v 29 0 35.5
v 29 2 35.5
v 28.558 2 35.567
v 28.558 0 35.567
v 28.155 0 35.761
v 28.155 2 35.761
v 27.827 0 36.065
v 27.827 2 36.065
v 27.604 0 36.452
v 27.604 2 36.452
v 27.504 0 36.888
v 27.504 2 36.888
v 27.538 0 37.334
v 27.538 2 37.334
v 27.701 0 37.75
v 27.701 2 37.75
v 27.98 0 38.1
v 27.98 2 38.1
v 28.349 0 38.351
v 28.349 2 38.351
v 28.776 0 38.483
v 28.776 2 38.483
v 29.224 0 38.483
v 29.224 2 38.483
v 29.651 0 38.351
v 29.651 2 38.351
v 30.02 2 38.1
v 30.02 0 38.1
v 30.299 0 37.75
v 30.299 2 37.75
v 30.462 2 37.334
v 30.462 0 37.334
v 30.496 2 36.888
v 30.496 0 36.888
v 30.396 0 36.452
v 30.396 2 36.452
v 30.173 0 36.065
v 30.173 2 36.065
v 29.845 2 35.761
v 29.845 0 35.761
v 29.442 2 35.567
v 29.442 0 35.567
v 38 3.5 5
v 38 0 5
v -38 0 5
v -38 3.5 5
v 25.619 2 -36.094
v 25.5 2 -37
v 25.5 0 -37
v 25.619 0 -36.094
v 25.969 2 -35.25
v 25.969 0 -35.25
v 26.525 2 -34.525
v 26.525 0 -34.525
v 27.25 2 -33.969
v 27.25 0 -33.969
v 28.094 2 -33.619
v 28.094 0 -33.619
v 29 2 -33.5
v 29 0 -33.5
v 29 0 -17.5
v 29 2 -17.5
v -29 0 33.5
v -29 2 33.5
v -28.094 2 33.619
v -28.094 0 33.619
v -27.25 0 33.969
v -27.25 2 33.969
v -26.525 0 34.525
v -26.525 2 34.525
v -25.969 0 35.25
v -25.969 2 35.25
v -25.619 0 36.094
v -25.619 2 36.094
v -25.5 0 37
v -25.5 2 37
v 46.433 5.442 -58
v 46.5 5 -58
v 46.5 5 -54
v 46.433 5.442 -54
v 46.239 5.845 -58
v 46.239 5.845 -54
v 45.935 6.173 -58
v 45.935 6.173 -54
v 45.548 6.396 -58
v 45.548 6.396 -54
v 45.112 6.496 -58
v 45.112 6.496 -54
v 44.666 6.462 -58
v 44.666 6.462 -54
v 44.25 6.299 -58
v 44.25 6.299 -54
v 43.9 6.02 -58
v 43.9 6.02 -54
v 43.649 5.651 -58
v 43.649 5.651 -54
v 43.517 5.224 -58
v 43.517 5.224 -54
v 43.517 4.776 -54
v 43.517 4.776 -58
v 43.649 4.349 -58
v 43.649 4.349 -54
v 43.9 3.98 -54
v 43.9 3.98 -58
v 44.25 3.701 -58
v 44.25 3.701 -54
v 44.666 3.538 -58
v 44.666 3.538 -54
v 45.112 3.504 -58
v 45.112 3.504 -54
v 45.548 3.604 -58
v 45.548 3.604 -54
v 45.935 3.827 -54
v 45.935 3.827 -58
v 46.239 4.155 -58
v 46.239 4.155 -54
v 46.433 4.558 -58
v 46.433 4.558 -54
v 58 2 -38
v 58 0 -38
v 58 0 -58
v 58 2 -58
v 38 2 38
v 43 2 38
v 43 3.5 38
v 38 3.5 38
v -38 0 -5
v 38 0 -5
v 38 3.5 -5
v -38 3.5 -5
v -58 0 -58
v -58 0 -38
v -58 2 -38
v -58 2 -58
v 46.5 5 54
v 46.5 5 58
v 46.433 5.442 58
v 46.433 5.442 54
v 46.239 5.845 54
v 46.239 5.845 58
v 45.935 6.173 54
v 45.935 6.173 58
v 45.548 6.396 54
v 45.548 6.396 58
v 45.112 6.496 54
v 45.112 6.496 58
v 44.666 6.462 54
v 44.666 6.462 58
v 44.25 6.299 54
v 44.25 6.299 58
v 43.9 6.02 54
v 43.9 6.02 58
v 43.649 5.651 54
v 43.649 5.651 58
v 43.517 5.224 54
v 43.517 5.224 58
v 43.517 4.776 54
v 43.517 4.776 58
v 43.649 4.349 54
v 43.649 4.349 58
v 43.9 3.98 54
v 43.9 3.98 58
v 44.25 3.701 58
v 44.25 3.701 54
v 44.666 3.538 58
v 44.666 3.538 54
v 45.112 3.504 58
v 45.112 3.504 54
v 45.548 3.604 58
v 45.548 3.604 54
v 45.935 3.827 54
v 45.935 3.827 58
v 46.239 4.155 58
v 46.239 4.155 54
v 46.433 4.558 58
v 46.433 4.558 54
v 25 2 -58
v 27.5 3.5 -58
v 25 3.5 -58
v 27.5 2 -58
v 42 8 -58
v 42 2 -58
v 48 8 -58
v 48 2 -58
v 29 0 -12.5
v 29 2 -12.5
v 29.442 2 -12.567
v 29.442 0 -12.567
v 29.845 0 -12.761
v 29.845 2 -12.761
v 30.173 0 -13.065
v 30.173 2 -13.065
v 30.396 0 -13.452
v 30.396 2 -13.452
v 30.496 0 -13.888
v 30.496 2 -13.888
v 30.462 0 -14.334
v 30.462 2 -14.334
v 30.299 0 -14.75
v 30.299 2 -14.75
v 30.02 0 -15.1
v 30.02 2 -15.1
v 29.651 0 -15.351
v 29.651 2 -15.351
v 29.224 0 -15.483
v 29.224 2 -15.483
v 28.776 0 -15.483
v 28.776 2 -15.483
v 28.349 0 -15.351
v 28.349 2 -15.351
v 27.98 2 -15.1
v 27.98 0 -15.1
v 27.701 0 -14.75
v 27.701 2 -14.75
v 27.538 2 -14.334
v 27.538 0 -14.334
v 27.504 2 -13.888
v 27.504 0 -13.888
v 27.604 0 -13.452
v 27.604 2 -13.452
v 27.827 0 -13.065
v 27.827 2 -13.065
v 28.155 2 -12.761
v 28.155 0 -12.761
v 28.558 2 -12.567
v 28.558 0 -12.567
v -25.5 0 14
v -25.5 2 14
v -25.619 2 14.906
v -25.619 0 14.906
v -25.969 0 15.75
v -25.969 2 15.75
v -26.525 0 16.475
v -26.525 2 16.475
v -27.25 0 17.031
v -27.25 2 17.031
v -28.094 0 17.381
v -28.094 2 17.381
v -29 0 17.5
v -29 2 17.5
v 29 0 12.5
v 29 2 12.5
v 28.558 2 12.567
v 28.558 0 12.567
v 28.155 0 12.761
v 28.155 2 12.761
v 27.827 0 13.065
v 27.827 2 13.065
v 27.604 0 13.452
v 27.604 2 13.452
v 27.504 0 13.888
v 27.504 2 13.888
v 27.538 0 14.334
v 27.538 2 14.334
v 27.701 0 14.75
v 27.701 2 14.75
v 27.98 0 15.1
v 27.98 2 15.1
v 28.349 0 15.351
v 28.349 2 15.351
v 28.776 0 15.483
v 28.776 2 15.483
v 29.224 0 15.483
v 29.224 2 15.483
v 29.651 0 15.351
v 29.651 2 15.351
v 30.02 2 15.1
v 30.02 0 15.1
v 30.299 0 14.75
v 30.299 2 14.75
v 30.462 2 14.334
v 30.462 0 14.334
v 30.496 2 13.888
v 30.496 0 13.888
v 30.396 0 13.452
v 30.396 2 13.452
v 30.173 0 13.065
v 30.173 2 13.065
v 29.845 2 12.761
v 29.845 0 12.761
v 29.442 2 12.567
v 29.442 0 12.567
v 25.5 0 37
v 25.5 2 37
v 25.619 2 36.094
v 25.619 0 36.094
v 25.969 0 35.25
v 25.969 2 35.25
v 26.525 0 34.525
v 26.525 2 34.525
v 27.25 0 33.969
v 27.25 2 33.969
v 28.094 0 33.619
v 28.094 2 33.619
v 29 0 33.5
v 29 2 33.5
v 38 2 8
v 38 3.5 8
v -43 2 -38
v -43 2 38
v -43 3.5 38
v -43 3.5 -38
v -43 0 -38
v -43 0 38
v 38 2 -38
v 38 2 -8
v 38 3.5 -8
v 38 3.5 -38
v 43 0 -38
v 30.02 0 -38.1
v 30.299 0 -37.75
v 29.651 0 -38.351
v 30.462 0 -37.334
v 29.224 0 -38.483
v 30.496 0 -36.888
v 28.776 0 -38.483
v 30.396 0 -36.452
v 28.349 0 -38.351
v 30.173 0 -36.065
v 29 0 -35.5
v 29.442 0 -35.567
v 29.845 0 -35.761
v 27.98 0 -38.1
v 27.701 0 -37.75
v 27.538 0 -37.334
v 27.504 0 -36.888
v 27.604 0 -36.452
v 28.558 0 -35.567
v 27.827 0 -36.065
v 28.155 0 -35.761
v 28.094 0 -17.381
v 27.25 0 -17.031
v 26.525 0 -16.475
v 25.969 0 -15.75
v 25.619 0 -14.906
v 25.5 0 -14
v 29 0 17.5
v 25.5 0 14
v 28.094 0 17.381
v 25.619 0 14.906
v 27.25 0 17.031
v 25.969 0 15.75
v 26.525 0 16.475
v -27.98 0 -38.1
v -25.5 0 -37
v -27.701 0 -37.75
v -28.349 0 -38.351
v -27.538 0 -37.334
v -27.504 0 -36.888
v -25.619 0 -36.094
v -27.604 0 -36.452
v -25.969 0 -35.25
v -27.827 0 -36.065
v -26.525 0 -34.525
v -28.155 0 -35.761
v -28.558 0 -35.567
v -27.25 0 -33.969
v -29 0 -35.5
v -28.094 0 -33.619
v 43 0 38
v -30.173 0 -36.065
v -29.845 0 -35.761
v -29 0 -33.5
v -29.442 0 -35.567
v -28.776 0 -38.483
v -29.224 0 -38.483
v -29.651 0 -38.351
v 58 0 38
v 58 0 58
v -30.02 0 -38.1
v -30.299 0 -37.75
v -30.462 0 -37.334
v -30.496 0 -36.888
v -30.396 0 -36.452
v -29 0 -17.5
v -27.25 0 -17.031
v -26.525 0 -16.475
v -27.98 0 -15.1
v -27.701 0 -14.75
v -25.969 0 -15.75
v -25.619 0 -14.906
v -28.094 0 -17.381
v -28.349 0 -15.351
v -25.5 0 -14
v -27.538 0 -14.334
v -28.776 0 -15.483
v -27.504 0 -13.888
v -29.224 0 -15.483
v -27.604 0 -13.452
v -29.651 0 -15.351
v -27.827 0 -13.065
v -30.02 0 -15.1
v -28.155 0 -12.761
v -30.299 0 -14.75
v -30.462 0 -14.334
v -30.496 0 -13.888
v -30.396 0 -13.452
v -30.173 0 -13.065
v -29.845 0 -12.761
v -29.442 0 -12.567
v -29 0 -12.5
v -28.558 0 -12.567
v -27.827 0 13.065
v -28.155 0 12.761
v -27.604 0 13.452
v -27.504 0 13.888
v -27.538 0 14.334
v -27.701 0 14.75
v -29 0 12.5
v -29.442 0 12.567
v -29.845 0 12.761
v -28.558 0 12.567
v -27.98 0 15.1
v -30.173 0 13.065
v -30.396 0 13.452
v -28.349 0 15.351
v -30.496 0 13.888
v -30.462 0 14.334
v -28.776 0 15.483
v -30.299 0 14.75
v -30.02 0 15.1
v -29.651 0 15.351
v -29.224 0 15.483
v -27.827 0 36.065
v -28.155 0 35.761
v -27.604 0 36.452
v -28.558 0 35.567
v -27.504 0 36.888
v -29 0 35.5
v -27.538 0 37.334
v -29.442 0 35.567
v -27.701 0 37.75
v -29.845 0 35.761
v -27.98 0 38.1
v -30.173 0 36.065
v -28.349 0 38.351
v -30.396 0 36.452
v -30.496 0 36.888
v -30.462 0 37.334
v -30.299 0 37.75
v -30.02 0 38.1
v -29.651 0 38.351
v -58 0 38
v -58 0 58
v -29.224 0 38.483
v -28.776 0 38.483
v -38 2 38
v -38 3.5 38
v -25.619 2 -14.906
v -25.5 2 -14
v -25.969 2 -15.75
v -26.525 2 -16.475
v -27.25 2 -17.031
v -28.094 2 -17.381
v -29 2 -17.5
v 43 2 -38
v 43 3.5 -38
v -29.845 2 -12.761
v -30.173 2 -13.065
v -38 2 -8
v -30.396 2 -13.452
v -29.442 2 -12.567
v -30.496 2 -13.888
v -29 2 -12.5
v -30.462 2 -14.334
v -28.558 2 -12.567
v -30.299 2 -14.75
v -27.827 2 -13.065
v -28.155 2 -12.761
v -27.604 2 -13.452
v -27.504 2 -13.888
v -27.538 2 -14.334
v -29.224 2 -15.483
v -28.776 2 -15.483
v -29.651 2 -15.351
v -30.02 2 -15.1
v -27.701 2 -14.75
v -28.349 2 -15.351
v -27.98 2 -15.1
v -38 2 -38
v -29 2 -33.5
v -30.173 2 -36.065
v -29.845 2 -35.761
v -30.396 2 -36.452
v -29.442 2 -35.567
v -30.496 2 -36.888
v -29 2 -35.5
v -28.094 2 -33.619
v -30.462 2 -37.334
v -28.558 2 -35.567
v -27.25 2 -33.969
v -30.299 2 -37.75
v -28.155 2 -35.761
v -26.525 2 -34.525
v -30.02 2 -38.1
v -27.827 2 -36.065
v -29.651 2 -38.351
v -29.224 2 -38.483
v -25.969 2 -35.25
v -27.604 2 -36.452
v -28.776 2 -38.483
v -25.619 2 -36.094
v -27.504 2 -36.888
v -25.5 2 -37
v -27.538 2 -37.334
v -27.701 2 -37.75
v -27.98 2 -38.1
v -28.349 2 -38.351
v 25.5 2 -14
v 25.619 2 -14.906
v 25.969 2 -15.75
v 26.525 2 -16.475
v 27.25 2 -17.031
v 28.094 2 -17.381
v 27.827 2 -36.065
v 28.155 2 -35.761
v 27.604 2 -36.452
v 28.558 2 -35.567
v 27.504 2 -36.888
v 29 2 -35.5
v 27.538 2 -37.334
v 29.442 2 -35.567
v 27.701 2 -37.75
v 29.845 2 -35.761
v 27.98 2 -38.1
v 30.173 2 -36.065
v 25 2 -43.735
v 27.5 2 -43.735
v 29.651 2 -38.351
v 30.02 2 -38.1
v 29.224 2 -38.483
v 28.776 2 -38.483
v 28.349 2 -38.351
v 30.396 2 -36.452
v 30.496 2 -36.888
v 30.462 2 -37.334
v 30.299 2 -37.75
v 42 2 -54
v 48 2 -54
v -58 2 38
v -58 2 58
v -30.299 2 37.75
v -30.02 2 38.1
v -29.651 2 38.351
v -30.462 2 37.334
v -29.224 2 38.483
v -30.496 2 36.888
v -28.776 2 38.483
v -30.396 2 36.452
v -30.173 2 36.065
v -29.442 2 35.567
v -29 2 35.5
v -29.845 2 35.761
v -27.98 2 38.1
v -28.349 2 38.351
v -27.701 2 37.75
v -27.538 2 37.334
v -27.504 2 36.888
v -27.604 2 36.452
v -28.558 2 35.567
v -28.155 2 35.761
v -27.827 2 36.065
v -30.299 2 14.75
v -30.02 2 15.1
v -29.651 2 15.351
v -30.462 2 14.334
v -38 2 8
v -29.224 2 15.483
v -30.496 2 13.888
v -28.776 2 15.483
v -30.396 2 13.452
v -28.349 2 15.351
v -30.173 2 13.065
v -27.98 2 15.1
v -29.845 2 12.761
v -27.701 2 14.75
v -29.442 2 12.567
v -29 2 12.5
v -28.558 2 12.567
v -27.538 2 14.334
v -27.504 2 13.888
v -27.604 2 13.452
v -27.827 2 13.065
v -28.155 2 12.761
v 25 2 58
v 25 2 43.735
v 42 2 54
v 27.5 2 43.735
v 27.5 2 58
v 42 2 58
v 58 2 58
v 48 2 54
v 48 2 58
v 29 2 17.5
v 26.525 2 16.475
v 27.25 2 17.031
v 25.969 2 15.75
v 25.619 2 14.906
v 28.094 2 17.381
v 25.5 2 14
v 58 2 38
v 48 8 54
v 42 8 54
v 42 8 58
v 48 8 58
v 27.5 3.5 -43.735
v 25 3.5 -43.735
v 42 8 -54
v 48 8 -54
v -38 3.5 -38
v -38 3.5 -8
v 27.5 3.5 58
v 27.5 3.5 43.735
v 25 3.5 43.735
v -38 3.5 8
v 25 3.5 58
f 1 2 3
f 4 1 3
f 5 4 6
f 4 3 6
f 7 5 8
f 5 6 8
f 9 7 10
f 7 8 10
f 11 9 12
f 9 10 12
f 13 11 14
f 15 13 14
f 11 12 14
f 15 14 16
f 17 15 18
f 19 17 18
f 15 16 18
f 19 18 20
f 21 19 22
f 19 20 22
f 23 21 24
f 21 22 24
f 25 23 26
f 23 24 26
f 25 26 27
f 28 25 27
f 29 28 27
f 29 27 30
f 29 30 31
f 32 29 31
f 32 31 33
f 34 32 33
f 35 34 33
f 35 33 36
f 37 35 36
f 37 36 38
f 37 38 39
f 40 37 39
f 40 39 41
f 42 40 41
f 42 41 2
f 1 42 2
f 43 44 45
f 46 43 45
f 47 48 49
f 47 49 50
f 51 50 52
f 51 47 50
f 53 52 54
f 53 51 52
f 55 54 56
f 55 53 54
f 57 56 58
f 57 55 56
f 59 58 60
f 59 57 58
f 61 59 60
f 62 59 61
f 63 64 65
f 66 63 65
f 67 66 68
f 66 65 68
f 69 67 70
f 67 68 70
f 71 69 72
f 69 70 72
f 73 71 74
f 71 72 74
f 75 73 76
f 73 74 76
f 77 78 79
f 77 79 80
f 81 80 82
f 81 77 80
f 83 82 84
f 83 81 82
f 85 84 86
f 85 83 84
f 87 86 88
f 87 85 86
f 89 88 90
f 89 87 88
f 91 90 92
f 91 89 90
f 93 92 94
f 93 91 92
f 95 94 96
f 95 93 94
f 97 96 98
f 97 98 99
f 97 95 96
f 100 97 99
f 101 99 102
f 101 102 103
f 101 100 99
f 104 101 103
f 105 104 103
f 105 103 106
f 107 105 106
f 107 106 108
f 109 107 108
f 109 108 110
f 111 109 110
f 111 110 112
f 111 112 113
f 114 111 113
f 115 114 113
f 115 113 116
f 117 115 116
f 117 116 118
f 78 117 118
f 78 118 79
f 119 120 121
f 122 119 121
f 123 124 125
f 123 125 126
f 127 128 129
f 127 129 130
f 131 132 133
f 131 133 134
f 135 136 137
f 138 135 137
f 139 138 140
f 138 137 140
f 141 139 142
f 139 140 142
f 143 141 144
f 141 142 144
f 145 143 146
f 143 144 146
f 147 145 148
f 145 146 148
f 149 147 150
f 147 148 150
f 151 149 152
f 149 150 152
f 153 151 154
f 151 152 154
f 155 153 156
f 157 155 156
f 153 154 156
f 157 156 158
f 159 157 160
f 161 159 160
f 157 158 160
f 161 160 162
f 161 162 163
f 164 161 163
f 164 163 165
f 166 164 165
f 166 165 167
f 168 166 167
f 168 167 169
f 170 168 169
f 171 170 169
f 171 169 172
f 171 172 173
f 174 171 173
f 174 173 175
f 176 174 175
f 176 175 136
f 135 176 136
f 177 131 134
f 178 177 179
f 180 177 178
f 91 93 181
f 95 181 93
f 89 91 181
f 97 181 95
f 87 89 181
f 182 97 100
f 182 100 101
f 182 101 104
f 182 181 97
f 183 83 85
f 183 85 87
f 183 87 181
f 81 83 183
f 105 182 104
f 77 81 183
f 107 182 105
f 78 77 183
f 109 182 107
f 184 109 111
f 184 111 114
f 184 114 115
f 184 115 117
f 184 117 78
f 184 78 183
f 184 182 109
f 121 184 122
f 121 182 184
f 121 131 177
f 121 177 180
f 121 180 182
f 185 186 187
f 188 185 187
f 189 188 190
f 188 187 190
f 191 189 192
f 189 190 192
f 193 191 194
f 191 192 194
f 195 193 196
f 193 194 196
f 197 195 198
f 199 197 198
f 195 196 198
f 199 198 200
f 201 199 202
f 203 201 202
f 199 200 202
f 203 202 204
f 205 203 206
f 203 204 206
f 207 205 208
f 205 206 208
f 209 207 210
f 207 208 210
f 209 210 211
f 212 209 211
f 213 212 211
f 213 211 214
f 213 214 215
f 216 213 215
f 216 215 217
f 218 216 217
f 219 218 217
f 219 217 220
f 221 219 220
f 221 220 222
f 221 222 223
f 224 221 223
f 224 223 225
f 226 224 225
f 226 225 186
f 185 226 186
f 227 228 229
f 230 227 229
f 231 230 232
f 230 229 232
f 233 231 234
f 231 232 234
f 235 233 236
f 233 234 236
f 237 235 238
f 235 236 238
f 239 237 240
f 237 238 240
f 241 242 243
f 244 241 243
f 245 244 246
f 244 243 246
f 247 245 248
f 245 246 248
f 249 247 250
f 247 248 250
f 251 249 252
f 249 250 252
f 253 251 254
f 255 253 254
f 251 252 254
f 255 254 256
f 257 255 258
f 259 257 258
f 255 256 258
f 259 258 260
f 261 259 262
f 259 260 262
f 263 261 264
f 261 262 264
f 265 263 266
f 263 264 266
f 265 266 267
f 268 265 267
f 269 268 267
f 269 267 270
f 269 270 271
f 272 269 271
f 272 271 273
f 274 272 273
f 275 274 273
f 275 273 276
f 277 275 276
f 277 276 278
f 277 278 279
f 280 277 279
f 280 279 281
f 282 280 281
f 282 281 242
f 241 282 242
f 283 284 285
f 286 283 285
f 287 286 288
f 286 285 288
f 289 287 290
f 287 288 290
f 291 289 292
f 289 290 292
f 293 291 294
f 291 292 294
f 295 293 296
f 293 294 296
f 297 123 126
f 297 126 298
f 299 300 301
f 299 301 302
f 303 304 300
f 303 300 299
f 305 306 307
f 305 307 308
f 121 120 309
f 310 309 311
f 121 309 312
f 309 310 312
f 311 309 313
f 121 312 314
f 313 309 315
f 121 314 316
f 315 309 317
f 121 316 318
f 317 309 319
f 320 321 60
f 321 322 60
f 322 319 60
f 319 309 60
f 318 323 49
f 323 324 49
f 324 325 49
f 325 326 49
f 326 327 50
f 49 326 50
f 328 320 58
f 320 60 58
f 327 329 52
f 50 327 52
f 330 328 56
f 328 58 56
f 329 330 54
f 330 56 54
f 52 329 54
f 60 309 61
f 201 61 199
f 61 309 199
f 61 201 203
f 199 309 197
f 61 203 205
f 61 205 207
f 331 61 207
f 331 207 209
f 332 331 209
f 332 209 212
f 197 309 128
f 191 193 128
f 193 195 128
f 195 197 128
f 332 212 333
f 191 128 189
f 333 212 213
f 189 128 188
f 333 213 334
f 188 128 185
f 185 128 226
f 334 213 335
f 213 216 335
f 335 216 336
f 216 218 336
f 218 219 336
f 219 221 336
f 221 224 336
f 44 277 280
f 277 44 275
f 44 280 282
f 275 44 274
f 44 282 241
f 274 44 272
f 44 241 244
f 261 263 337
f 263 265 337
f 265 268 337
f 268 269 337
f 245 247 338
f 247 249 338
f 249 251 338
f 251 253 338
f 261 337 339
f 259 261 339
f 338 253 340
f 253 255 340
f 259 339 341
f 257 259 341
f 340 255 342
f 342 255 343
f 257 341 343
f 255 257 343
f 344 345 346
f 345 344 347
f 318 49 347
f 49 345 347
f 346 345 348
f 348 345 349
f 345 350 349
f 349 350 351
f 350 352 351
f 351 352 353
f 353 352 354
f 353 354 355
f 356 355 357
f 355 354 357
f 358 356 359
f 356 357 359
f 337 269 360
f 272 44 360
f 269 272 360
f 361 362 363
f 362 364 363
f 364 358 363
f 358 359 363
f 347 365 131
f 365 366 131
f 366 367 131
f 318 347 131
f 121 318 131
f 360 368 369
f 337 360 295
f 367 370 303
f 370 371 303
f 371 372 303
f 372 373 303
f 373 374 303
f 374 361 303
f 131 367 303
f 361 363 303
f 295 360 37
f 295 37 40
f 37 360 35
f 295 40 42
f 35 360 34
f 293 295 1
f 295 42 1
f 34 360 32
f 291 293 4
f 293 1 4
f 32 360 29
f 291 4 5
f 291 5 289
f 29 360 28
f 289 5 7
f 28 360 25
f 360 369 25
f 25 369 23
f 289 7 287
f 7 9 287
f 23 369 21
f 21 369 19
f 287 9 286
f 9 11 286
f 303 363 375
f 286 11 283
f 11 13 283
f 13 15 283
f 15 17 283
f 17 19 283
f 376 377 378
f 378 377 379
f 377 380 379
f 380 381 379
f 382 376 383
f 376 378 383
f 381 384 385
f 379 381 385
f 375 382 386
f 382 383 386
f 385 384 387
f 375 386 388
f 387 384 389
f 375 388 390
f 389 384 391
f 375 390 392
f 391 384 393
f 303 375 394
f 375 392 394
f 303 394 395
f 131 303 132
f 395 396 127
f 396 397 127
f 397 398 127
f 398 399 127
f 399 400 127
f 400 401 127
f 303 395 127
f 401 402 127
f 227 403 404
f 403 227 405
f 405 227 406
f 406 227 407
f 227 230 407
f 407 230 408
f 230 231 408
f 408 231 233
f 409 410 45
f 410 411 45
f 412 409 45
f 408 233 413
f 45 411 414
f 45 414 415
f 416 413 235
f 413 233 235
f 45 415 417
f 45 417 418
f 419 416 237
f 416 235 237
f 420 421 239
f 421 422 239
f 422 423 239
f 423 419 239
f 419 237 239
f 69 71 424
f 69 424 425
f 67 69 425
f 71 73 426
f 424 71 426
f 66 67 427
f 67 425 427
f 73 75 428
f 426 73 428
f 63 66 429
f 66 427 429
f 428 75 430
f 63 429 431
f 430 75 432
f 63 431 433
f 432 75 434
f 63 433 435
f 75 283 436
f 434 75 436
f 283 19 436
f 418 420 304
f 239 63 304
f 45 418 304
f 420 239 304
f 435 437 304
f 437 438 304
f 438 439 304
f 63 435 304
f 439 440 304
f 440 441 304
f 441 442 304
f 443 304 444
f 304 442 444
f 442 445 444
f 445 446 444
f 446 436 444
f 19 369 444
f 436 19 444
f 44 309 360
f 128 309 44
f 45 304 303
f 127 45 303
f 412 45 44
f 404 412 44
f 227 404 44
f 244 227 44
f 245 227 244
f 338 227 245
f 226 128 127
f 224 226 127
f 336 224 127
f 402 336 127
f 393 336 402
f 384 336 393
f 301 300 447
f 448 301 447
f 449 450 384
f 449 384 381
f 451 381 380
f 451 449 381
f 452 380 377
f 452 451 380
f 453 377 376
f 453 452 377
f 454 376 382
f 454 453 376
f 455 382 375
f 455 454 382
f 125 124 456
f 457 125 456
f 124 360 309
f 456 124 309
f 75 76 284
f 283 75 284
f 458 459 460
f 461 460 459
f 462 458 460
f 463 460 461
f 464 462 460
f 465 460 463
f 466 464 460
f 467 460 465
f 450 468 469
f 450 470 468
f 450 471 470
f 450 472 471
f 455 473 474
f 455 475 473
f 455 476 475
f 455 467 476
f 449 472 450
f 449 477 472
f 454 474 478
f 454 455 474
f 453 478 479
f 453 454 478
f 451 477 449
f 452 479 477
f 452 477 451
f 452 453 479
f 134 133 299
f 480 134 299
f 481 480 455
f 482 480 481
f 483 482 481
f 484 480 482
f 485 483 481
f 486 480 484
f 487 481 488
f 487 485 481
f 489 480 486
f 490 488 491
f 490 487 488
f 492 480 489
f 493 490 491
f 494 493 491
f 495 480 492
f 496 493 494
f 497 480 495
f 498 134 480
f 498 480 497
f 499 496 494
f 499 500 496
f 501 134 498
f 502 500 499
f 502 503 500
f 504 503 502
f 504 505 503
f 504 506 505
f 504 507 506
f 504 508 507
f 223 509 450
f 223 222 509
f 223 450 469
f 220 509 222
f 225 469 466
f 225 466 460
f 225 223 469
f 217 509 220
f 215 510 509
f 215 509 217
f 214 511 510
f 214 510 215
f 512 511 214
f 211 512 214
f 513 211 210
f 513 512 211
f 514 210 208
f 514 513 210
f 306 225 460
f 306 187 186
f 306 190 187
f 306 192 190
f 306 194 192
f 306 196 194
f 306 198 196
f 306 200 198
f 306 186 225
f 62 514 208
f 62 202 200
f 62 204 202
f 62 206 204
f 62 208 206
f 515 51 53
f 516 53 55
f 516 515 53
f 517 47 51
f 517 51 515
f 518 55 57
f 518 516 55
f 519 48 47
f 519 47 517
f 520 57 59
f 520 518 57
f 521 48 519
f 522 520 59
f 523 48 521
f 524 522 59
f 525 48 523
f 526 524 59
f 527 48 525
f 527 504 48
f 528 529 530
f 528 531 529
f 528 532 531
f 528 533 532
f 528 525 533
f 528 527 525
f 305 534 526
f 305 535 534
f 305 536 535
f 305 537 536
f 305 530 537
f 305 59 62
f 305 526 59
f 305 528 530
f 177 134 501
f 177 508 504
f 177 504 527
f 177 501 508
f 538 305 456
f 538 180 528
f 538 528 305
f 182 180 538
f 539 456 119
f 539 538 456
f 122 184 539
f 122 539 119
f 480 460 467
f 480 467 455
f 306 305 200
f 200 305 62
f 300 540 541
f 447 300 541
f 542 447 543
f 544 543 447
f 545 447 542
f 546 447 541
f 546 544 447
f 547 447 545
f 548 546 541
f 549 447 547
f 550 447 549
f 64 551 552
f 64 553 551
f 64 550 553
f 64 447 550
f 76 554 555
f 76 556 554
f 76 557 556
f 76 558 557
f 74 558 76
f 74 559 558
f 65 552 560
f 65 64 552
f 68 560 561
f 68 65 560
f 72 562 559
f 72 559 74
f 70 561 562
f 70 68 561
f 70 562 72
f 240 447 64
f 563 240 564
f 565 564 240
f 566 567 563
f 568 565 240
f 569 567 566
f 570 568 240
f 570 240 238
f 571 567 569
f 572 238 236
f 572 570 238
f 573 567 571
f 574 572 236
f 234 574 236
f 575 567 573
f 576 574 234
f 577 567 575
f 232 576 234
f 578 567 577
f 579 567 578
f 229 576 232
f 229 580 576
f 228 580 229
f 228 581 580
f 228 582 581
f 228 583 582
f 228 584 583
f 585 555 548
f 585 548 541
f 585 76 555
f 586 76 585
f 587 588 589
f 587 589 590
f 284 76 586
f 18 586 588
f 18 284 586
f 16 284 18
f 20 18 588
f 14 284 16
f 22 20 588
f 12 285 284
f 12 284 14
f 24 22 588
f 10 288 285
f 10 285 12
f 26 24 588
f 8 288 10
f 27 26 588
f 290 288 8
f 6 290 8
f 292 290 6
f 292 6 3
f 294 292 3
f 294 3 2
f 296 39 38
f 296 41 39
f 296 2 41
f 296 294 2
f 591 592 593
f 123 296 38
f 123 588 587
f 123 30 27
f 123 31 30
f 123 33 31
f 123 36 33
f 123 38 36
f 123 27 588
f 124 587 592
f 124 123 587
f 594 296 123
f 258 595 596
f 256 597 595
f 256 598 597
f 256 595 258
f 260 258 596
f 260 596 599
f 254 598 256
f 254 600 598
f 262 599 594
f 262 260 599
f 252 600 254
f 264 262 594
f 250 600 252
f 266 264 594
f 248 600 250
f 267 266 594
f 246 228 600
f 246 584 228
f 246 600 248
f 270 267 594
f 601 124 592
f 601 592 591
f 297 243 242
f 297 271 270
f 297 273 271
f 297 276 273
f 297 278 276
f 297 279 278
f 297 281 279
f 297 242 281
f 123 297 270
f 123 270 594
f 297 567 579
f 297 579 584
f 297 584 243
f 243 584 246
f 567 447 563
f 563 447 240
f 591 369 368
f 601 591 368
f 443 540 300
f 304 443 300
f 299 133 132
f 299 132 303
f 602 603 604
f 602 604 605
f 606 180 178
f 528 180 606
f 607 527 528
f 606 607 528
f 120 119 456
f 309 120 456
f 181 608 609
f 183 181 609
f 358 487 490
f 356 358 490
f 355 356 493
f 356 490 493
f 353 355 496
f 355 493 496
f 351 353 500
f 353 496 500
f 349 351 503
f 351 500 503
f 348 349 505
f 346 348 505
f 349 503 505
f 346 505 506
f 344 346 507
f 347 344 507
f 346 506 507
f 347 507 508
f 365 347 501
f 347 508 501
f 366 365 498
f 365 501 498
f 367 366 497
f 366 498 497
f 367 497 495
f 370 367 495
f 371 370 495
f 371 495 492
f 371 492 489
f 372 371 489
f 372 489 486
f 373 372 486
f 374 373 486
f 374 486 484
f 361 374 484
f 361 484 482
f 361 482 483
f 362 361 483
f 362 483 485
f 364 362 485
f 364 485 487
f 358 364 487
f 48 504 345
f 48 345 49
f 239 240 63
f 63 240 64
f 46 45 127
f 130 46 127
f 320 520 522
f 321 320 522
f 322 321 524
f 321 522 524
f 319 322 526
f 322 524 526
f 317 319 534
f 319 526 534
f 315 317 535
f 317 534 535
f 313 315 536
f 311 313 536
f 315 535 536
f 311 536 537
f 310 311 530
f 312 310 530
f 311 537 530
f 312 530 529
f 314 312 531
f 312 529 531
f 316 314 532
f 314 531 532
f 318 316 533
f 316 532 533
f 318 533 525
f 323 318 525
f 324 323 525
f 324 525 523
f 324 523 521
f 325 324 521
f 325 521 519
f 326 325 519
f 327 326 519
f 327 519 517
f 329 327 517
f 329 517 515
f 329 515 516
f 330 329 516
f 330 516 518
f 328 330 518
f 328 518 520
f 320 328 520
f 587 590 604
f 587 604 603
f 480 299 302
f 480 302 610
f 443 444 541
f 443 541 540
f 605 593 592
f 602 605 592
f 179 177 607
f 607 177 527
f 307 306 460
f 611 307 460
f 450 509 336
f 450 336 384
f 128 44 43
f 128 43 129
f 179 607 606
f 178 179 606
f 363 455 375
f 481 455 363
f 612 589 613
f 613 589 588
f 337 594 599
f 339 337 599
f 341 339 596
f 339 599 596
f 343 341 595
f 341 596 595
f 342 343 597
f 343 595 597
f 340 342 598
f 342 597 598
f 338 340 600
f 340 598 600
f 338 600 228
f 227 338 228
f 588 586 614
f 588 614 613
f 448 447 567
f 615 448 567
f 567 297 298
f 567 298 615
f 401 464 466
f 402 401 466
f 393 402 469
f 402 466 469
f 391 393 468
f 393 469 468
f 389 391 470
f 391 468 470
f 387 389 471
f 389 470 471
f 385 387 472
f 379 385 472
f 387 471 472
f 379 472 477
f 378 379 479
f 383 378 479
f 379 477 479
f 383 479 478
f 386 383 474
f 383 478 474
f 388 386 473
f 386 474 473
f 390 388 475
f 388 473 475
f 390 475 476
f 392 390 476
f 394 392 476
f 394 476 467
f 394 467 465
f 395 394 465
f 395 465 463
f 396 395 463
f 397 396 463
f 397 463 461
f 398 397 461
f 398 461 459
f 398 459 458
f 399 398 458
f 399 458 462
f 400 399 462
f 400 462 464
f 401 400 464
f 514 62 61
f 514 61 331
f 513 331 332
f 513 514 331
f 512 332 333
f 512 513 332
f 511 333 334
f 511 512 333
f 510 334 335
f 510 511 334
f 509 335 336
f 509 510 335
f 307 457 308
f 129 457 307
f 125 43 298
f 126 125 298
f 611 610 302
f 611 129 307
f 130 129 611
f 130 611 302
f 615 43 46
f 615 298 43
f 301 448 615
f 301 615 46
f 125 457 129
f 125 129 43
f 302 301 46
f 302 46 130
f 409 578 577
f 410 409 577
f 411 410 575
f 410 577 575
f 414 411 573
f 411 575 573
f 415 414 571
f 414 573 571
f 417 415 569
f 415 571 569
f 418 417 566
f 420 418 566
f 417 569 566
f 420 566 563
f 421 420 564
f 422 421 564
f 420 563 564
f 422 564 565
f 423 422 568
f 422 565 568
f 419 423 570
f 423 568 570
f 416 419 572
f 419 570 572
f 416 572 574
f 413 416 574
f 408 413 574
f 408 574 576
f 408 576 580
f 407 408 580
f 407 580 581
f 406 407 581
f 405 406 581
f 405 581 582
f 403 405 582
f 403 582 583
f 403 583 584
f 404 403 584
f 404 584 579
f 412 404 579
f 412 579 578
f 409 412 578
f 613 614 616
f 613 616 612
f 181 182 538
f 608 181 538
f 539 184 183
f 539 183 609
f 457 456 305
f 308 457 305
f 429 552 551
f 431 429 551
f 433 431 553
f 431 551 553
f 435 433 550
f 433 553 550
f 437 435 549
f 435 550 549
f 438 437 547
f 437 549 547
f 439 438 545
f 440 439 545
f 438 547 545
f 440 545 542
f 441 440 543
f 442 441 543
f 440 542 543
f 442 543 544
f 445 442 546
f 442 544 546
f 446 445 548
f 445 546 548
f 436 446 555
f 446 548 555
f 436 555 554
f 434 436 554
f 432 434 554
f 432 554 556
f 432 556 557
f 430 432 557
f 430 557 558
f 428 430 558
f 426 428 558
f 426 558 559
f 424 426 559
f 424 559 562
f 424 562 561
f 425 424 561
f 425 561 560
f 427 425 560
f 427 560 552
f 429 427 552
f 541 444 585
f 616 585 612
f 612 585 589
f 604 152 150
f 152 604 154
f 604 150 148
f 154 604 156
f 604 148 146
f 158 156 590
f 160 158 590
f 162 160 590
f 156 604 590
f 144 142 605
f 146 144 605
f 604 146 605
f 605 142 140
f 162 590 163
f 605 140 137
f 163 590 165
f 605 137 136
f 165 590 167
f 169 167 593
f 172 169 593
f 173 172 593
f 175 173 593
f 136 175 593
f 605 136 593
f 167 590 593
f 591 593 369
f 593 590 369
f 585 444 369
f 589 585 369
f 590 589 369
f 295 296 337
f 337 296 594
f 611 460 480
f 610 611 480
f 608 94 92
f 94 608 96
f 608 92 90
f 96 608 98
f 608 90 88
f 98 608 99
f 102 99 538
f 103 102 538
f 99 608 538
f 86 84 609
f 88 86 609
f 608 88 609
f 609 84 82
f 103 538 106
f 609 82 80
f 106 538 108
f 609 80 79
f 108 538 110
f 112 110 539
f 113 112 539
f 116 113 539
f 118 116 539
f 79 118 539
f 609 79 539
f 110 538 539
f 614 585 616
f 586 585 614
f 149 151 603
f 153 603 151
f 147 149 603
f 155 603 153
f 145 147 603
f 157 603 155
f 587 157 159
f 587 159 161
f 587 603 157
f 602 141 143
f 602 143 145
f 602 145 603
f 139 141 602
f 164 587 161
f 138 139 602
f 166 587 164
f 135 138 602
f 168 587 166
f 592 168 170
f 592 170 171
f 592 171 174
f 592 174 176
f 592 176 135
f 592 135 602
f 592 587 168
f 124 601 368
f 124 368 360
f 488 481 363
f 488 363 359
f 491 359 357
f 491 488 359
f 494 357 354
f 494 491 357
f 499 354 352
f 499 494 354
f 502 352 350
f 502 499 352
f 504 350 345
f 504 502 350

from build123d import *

# Parameters (mm, degrees)
SKETCH1_W                   = 116
SKETCH1_H                   = 116
BOSS_EXTRUDE1_DEPTH         = 2
CUT_EXTRUDE1_REACH          = 84.049
SKETCH2_W                   = 15
SKETCH2_H                   = 76
CIRPATTERN1_COUNT           = 2
CUT_EXTRUDE2_REACH          = 84.049
SKETCH3_R                   = 1.5
CUT_EXTRUDE3_REACH          = 84.049
SKETCH4_R                   = 1.5
LPATTERN1_COUNT             = 2
LPATTERN1_PITCH             = 23
CIRPATTERN2_COUNT           = 2
CIRPATTERN2_COPY_1_REACH    = 84.049
CIRPATTERN2_COPY_1_SKETCH_R = 1.5
CIRPATTERN2_COPY_2_REACH    = 84.049
CIRPATTERN2_COPY_2_SKETCH_R = 1.5
CUT_EXTRUDE4_REACH          = 84.049
SKETCH5_W                   = 76
SKETCH5_H                   = 16
SKETCH6_W                   = 6
SKETCH6_H                   = 4
BOSS_EXTRUDE2_DEPTH         = 6
CUT_EXTRUDE5_REACH          = 131.938
SKETCH7_R                   = 1.5
CUT_EXTRUDE7_REACH          = 84.244
SKETCH9_W                   = 5
SKETCH9_H                   = 76
BOSS_EXTRUDE3_DEPTH         = 1.5
SKETCH10_W                  = 76
SKETCH10_H                  = 3
BOSS_EXTRUDE4_DEPTH         = 3.5
SKETCH11_W                  = 2.5
SKETCH11_H                  = 14.264665063
BOSS_EXTRUDE5_DEPTH         = 1.5


with BuildPart() as part:
    # Sketch1 → Boss-Extrude1 (new body)
    with BuildSketch(Plane(origin=(0, 0, 0), x_dir=(1, 0, 0), z_dir=(0, 1, 0))):
        Rectangle(SKETCH1_W, SKETCH1_H)
    extrude(amount=BOSS_EXTRUDE1_DEPTH)

    # Sketch2 → Cut-Extrude1 (cut, up to next)
    with BuildSketch(Plane(origin=(0, 2, 0), x_dir=(1, 0, 0), z_dir=(0, 1, 0)), mode=Mode.PRIVATE) as cut_extrude1_sk1:
        with Locations((-50.5, 0)):
            Rectangle(SKETCH2_W, SKETCH2_H)
    cut_extrude1_tool1 = extrude(cut_extrude1_sk1.sketch, amount=-CUT_EXTRUDE1_REACH, mode=Mode.PRIVATE) & part.part
    cut_extrude1 = cut_extrude1_tool1.solids().sort_by_distance((-50.5, 2, 0))[0]
    add(cut_extrude1, mode=Mode.SUBTRACT)

    # CirPattern1: Cut-Extrude1 ×2 about axis
    cirpattern1_axis = Axis((0, 0, 0), (0, 1, 0))
    for i in range(1, CIRPATTERN1_COUNT):
        add(cut_extrude1.rotate(cirpattern1_axis, i * 360 / CIRPATTERN1_COUNT), mode=Mode.SUBTRACT)

    # Sketch3 → Cut-Extrude2 (cut, up to next)
    with BuildSketch(Plane(origin=(0, 2, 0), x_dir=(1, 0, 0), z_dir=(0, 1, 0)), mode=Mode.PRIVATE) as cut_extrude2_sk1:
        with Locations(Location((-29, 37, 0), (0, 0, 270))):
            Circle(SKETCH3_R)
    cut_extrude2_tool1 = extrude(cut_extrude2_sk1.sketch, amount=-CUT_EXTRUDE2_REACH, mode=Mode.PRIVATE) & part.part
    cut_extrude2 = cut_extrude2_tool1.solids().sort_by_distance((-29, 2, -37))[0]
    add(cut_extrude2, mode=Mode.SUBTRACT)

    # Sketch4 → Cut-Extrude3 (cut, up to next)
    with BuildSketch(Plane(origin=(0, 2, 0), x_dir=(1, 0, 0), z_dir=(0, 1, 0)), mode=Mode.PRIVATE) as cut_extrude3_sk1:
        with Locations(Location((29, 37, 0), (0, 0, 270))):
            Circle(SKETCH4_R)
    cut_extrude3_tool1 = extrude(cut_extrude3_sk1.sketch, amount=-CUT_EXTRUDE3_REACH, mode=Mode.PRIVATE) & part.part
    cut_extrude3 = cut_extrude3_tool1.solids().sort_by_distance((29, 2, -37))[0]
    add(cut_extrude3, mode=Mode.SUBTRACT)

    # LPattern1: Cut-Extrude2, Cut-Extrude3 ×2
    with Locations(*[(0, 0, i * LPATTERN1_PITCH) for i in range(1, LPATTERN1_COUNT)]):
        add(cut_extrude2, mode=Mode.SUBTRACT)
        add(cut_extrude3, mode=Mode.SUBTRACT)

    # CirPattern2: Cut-Extrude2, Cut-Extrude3 ×2 about axis
    cirpattern2_axis = Axis((0, 0, 0), (0, 1, 0))
    add([cut_extrude2.rotate(cirpattern2_axis, i * 360 / CIRPATTERN2_COUNT) for i in range(1, CIRPATTERN2_COUNT)], mode=Mode.SUBTRACT)
    add([cut_extrude3.rotate(cirpattern2_axis, i * 360 / CIRPATTERN2_COUNT) for i in range(1, CIRPATTERN2_COUNT)], mode=Mode.SUBTRACT)

    # CirPattern2 copy 1 sketch → CirPattern2 copy 1 (cut, up to next)
    with BuildSketch(Plane(origin=(0, 2, -23), x_dir=(-1, 0, 0), z_dir=(0, 1, 0)), mode=Mode.PRIVATE) as cirpattern2_copy_1_sk1:
        with Locations(Location((-29, 37, 0), (0, 0, 270))):
            Circle(CIRPATTERN2_COPY_1_SKETCH_R)
    cirpattern2_copy_1_tool1 = extrude(cirpattern2_copy_1_sk1.sketch, amount=-CIRPATTERN2_COPY_1_REACH, mode=Mode.PRIVATE) & part.part
    add(cirpattern2_copy_1_tool1.solids().sort_by_distance((29, 2, 14))[0], mode=Mode.SUBTRACT)

    # CirPattern2 copy 2 sketch → CirPattern2 copy 2 (cut, up to next)
    with BuildSketch(Plane(origin=(0, 2, -23), x_dir=(-1, 0, 0), z_dir=(0, 1, 0)), mode=Mode.PRIVATE) as cirpattern2_copy_2_sk1:
        with Locations(Location((29, 37, 0), (0, 0, 270))):
            Circle(CIRPATTERN2_COPY_2_SKETCH_R)
    cirpattern2_copy_2_tool1 = extrude(cirpattern2_copy_2_sk1.sketch, amount=-CIRPATTERN2_COPY_2_REACH, mode=Mode.PRIVATE) & part.part
    add(cirpattern2_copy_2_tool1.solids().sort_by_distance((-29, 2, 14))[0], mode=Mode.SUBTRACT)

    # Sketch5 → Cut-Extrude4 (cut, up to next)
    with BuildSketch(Plane(origin=(0, 2, 0), x_dir=(1, 0, 0), z_dir=(0, 1, 0)), mode=Mode.PRIVATE) as cut_extrude4_sk1:
        Rectangle(SKETCH5_W, SKETCH5_H)
    cut_extrude4_tool1 = extrude(cut_extrude4_sk1.sketch, amount=-CUT_EXTRUDE4_REACH, mode=Mode.PRIVATE) & part.part
    add(cut_extrude4_tool1.solids().sort_by_distance((0, 2, 0))[0], mode=Mode.SUBTRACT)

    # Sketch6 → Boss-Extrude2 (add)
    with BuildSketch(Plane(origin=(0, 2, 0), x_dir=(1, 0, 0), z_dir=(0, 1, 0))):
        with Locations((45, -56)):
            Rectangle(SKETCH6_W, SKETCH6_H)
    boss_extrude2 = extrude(amount=BOSS_EXTRUDE2_DEPTH)

    # Sketch7 → Cut-Extrude5 (cut, up to next)
    with BuildSketch(Plane.XY.offset(58), mode=Mode.PRIVATE) as cut_extrude5_sk1:
        with Locations((45, 5)):
            Circle(SKETCH7_R)
    cut_extrude5_tool1 = extrude(cut_extrude5_sk1.sketch, amount=-CUT_EXTRUDE5_REACH, mode=Mode.PRIVATE) & part.part
    cut_extrude5 = cut_extrude5_tool1.solids().sort_by_distance((45, 5, 58))[0]
    add(cut_extrude5, mode=Mode.SUBTRACT)

    # Mirror1: Boss-Extrude2, Cut-Extrude5 across plane
    add(boss_extrude2.mirror(Plane.XY))
    add(cut_extrude5.mirror(Plane.XY), mode=Mode.SUBTRACT)

    # Sketch8 → Cut-Extrude7 (cut, up to next)
    with BuildSketch(Plane(origin=(0, 2, 0), x_dir=(1, 0, 0), z_dir=(0, 1, 0)), mode=Mode.PRIVATE) as cut_extrude7_sk1:
        with BuildLine():
            ThreePointArc((-29, -33.5), (-26.525126266, -34.525126266), (-25.5, -37))
            Line((-25.5, -37), (25.5, -37))
            ThreePointArc((25.5, -37), (26.525126266, -34.525126266), (29, -33.5))
            Line((29, -33.5), (29, -17.5))
            ThreePointArc((29, -17.5), (26.525126266, -16.474873734), (25.5, -14))
            Line((25.5, -14), (-25.5, -14))
            ThreePointArc((-25.5, -14), (-26.525126266, -16.474873734), (-29, -17.5))
            Line((-29, -17.5), (-29, -33.5))
        make_face()
    cut_extrude7_tool1 = extrude(cut_extrude7_sk1.sketch, amount=-CUT_EXTRUDE7_REACH, mode=Mode.PRIVATE) & part.part
    cut_extrude7 = cut_extrude7_tool1.solids().sort_by_distance((0, 2, 25.5))[0]
    add(cut_extrude7, mode=Mode.SUBTRACT)

    # Mirror2: Cut-Extrude7 across plane
    add(cut_extrude7.mirror(Plane.XY), mode=Mode.SUBTRACT)

    # Sketch9 → Boss-Extrude3 (add)
    with BuildSketch(Plane(origin=(0, 2, 0), x_dir=(1, 0, 0), z_dir=(0, 1, 0))):
        with Locations((-40.5, 0)):
            Rectangle(SKETCH9_W, SKETCH9_H)
    boss_extrude3 = extrude(amount=BOSS_EXTRUDE3_DEPTH)

    # Mirror3: Boss-Extrude3 across plane
    add(boss_extrude3.mirror(Plane(origin=(0, 0, 0), x_dir=(0, 0, 1), z_dir=(1, 0, 0))))

    # Sketch10 → Boss-Extrude4 (add)
    with BuildSketch(Plane(origin=(0, 0, 0), x_dir=(-1, 0, 0), z_dir=(0, -1, 0))):
        with Locations((0, 6.5)):
            Rectangle(SKETCH10_W, SKETCH10_H)
    boss_extrude4 = extrude(amount=-BOSS_EXTRUDE4_DEPTH)

    # Mirror4: Boss-Extrude4 across plane
    add(boss_extrude4.mirror(Plane.XY))

    # Sketch11 → Boss-Extrude5 (add)
    with BuildSketch(Plane(origin=(0, 2, 0), x_dir=(1, 0, 0), z_dir=(0, 1, 0))):
        with Locations((26.25, -50.867667469)):
            Rectangle(SKETCH11_W, SKETCH11_H)
    boss_extrude5 = extrude(amount=BOSS_EXTRUDE5_DEPTH)

    # Mirror5: Boss-Extrude5 across plane
    add(boss_extrude5.mirror(Plane.XY))


solid = part.part
